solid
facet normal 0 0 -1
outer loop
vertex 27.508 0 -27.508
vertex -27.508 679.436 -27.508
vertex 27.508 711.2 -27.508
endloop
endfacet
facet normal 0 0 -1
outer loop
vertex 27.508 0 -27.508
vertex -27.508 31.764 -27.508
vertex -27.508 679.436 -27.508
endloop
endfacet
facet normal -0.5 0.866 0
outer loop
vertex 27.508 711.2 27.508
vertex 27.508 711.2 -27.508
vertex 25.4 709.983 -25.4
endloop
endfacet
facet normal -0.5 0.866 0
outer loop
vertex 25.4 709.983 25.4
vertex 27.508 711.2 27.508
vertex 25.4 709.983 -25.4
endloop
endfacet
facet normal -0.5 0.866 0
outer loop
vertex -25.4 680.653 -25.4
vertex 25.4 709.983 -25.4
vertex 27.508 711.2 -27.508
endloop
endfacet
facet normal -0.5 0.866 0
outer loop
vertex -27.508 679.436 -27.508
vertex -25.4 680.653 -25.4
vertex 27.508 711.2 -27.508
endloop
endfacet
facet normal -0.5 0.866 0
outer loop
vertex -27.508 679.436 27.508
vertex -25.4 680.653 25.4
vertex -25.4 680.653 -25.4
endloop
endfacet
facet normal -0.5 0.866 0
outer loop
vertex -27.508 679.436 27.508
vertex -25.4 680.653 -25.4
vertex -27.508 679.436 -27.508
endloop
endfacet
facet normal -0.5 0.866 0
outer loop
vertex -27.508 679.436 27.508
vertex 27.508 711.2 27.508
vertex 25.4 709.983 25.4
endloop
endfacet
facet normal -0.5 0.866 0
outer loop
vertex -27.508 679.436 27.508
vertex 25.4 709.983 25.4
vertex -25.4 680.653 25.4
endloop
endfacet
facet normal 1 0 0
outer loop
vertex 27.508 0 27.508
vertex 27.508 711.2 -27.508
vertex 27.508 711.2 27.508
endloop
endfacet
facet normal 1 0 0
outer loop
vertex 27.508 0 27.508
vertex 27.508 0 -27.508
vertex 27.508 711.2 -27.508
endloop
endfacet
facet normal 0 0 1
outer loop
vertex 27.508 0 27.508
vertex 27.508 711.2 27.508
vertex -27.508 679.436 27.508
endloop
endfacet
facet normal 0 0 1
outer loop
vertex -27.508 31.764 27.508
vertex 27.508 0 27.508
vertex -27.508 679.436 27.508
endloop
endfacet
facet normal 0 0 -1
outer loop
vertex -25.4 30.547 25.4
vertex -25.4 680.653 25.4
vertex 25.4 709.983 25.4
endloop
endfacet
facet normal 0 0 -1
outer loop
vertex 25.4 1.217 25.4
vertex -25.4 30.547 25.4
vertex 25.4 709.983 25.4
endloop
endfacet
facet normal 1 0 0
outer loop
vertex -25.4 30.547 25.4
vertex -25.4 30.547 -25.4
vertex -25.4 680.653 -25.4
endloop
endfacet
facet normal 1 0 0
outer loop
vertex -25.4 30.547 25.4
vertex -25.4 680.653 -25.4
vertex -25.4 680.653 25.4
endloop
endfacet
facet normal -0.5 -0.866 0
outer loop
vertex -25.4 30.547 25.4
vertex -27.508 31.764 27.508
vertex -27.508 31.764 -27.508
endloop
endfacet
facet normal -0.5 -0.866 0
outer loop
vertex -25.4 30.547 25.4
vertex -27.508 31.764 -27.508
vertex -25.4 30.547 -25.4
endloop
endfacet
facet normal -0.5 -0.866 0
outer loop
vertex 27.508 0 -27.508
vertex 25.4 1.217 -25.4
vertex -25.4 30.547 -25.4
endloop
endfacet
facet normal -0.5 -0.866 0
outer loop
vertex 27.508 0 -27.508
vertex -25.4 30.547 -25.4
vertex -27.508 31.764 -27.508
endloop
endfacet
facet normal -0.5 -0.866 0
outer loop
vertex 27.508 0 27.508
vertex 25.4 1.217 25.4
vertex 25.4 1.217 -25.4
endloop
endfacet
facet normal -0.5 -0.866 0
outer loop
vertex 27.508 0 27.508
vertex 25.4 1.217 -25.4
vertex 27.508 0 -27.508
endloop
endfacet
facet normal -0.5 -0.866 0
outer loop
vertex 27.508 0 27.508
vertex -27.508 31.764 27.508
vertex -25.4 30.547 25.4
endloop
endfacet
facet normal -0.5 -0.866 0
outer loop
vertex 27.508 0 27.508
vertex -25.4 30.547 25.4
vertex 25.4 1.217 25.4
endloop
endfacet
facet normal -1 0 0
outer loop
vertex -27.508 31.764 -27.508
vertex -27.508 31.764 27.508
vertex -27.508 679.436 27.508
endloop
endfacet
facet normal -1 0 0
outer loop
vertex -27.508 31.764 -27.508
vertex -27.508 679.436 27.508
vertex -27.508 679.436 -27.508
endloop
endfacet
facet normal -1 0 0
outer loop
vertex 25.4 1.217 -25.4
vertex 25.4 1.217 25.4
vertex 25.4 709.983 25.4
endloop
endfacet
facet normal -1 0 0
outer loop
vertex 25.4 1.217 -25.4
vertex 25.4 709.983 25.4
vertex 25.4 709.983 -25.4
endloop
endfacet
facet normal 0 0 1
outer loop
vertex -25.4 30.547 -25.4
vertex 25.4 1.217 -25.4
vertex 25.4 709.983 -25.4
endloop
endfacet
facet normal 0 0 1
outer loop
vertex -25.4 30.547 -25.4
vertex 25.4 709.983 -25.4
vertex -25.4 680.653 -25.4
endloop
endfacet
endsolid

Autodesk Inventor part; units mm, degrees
ref_plane "YZ Plane" through (0, 0, 0) normal (1, 0, 0) x (0, 1, 0)
ref_plane "XZ Plane" through (0, 0, 0) normal (0, 1, 0) x (-1, 0, 0)
ref_plane "XY Plane" through (0, 0, 0) normal (0, 0, 1) x (1, 0, 0)
sketch "Sketch1" plane through (0, 0, 0) normal (0, 1, 0) x (-1, 0, 0)
  line L0 (25.4, 25.4) -> (-25.4, 25.4)
  line L1 (-25.4, 25.4) -> (-25.4, -25.4)
  line L2 (-25.4, -25.4) -> (25.4, -25.4)
  line L3 (25.4, -25.4) -> (25.4, 25.4)
  line L4 (-27.5082, 27.5082) -> (27.5082, 27.5082)
  line L5 (27.5082, 27.5082) -> (27.5082, -27.5082)
  line L6 (27.5082, -27.5082) -> (-27.5082, -27.5082)
  line L7 (-27.5082, -27.5082) -> (-27.5082, 27.5082)
  point P0 (0, 0)
  point P1 (25.4, 0)
  point P2 (0, -25.4)
  dimension "d0" = 50.8
  dimension "d1" = 50.8
  dimension "d2" = 2.1082
extrude "Extrusion1" add sketch "Sketch1" along normal blind 711.2
sketch "Sketch2" plane through (-27.5082, 0, 27.5082) normal (0, 0, 1) x (1, 0, 0)
  line L0 (0, 0) -> (55.0164, 0)
  line L1 (55.0164, 0) -> (0, 0) projected
  line L2 (0, 31.7637) -> (55.0164, 0)
  line L3 (0, 0) -> (0, 711.2) projected
  line L4 (0, 31.7637) -> (0, 0)
  line L5 (2.1082, 0) -> (2.1082, 711.2) projected
  line L6 (0, 711.2) -> (55.0164, 711.2)
  line L7 (0, 711.2) -> (55.0164, 711.2) projected
  line L8 (55.0164, 711.2) -> (0, 679.4363)
  line L9 (0, 679.4363) -> (0, 711.2)
  point P0 (27.5082, 0)
  dimension "d5" = 30
  dimension "d6" = 30
extrude "Extrusion2" cut sketch "Sketch2" against normal through all contours L3 L2 L5 L0 | L5 L2 L0 | L3 L6 L5 L8 | L5 L6 L8
properties part number "Square_30degree"
